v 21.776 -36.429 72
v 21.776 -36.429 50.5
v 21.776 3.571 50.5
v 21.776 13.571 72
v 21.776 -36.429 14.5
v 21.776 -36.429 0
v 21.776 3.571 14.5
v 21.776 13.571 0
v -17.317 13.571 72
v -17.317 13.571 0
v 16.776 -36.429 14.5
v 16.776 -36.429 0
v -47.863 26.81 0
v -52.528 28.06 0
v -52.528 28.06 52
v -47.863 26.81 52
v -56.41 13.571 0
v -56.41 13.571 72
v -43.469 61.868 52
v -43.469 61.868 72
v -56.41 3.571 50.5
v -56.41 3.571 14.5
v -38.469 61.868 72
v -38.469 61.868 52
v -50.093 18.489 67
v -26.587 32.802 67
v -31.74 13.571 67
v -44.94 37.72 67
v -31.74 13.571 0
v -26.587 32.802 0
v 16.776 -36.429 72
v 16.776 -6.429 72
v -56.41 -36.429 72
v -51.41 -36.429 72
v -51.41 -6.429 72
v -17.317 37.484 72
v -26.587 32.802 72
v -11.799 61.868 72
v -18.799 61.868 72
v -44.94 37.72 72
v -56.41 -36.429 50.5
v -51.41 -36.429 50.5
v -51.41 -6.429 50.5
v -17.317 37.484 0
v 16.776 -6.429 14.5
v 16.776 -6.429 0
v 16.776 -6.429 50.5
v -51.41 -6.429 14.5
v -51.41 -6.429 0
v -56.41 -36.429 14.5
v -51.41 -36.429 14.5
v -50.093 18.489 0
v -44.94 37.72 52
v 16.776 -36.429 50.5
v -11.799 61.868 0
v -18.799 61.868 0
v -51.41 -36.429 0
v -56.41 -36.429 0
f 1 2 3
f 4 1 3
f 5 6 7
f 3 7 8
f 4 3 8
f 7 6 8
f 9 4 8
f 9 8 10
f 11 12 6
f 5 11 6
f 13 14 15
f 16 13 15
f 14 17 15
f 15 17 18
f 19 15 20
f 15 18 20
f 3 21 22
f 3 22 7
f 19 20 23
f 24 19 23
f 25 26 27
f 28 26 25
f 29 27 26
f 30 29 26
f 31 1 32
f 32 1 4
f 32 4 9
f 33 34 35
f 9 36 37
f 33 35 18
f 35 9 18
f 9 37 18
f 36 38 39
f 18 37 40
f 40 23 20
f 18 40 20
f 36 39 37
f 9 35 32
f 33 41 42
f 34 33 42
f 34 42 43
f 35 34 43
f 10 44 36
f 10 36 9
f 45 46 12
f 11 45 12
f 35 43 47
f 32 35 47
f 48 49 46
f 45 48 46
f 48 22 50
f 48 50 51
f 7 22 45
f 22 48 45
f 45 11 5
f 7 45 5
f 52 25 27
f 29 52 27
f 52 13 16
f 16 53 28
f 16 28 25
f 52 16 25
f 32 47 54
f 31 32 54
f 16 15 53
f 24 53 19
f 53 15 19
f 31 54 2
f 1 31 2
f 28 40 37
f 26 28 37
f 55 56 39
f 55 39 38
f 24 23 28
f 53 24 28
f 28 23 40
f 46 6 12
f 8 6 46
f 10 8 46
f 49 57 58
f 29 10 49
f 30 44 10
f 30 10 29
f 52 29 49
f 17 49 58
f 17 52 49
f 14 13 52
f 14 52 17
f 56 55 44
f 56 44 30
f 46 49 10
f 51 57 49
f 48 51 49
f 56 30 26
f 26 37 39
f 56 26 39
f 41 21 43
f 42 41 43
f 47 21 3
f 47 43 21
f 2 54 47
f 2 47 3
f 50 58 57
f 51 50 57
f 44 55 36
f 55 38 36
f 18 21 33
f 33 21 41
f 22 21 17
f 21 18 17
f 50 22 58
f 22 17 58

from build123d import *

# Parameters (mm, degrees)
EXTRUDE_1_DEPTH     = 72
SKETCH_2_W          = 68.186813186
SKETCH_2_H          = 36
CUT_EXTRUDE_1_DEPTH = 10
SKETCH_3_W          = 5
SKETCH_3_H          = 36
CUT_EXTRUDE_3_DEPTH = 40
SKETCH_4_W          = 5
SKETCH_4_H          = 36
CUT_EXTRUDE_4_DEPTH = 40
EXTRUDE_2_DEPTH     = 5
EXTRUDE_3_DEPTH     = 67
SKETCH_8_W          = 52
SKETCH_8_H          = 38.074034261
CUT_EXTRUDE_5_DEPTH = 5


with BuildPart() as part:
    # 草圖1 → 填料-伸長1 (new body)
    with BuildSketch(Plane.XY):
        Polygon((-56.41038016, 13.571428571), (-56.41038016, -36.428571429), (-51.41038016, -36.428571429), (-51.41038016, -6.428571429), (16.776433026, -6.428571429), (16.776433026, -36.428571429), (21.776433026, -36.428571429), (21.776433026, 13.571428571), align=None)
    extrude(amount=EXTRUDE_1_DEPTH)

    # 草圖2 → 除料-伸長1 (cut)
    with BuildSketch(Plane.XZ.offset(6.428571429)):
        with Locations((-17.316973567, 32.5)):
            Rectangle(SKETCH_2_W, SKETCH_2_H)
    extrude(amount=-CUT_EXTRUDE_1_DEPTH, mode=Mode.SUBTRACT)

    # 草圖3 → 除料-伸長3 (cut)
    with BuildSketch(Plane.XZ.offset(36.428571429)):
        with Locations((-53.91038016, 32.5)):
            Rectangle(SKETCH_3_W, SKETCH_3_H)
    extrude(amount=-CUT_EXTRUDE_3_DEPTH, mode=Mode.SUBTRACT)

    # 草圖4 → 除料-伸長4 (cut)
    with BuildSketch(Plane.XZ.offset(36.428571429)):
        with Locations((19.276433026, 32.5)):
            Rectangle(SKETCH_4_W, SKETCH_4_H)
    extrude(amount=-CUT_EXTRUDE_4_DEPTH, mode=Mode.SUBTRACT)

    # 草圖5 → 填料-伸長2 (add)
    with BuildSketch(Plane.XY.offset(72)):
        Polygon((-56.41038016, 13.571428571), (-43.469427905, 61.867719886), (-38.469427905, 61.867719886), (-44.939904033, 37.719574229), (-26.587313333, 32.802012372), (-18.799180477, 61.867719886), (-11.799180477, 61.867719886), (-17.316973567, 37.484242705), (-17.316973567, 13.571428571), align=None)
    extrude(amount=-EXTRUDE_2_DEPTH)

    # 草圖7 → 填料-伸長3 (add)
    with BuildSketch(Plane(origin=(0, 0, 67), x_dir=(-1, 0, 0), z_dir=(0, 0, -1))):
        Polygon((17.316973567, 13.571428571), (31.740132733, 13.571428571), (26.587313333, 32.802012372), (18.799180477, 61.867719886), (11.799180477, 61.867719886), (17.316973567, 37.484242705), align=None)
        Polygon((31.740132733, 13.571428571), (56.41038016, 13.571428571), (43.469427905, 61.867719886), (38.469427905, 61.867719886), (44.939904033, 37.719574229), (50.092723432, 18.488990428), align=None)
    extrude(amount=EXTRUDE_3_DEPTH)

    # 草圖8 → 除料-伸長5 (cut)
    with BuildSketch(Plane(origin=(-56.024458351, 15.011708372, 0), x_dir=(0, 0, 1), z_dir=(-0.965925826, 0.258819045, 0))):
        with Locations((26, 32.545929761)):
            Rectangle(SKETCH_8_W, SKETCH_8_H)
    extrude(amount=-CUT_EXTRUDE_5_DEPTH, mode=Mode.SUBTRACT)


solid = part.part
